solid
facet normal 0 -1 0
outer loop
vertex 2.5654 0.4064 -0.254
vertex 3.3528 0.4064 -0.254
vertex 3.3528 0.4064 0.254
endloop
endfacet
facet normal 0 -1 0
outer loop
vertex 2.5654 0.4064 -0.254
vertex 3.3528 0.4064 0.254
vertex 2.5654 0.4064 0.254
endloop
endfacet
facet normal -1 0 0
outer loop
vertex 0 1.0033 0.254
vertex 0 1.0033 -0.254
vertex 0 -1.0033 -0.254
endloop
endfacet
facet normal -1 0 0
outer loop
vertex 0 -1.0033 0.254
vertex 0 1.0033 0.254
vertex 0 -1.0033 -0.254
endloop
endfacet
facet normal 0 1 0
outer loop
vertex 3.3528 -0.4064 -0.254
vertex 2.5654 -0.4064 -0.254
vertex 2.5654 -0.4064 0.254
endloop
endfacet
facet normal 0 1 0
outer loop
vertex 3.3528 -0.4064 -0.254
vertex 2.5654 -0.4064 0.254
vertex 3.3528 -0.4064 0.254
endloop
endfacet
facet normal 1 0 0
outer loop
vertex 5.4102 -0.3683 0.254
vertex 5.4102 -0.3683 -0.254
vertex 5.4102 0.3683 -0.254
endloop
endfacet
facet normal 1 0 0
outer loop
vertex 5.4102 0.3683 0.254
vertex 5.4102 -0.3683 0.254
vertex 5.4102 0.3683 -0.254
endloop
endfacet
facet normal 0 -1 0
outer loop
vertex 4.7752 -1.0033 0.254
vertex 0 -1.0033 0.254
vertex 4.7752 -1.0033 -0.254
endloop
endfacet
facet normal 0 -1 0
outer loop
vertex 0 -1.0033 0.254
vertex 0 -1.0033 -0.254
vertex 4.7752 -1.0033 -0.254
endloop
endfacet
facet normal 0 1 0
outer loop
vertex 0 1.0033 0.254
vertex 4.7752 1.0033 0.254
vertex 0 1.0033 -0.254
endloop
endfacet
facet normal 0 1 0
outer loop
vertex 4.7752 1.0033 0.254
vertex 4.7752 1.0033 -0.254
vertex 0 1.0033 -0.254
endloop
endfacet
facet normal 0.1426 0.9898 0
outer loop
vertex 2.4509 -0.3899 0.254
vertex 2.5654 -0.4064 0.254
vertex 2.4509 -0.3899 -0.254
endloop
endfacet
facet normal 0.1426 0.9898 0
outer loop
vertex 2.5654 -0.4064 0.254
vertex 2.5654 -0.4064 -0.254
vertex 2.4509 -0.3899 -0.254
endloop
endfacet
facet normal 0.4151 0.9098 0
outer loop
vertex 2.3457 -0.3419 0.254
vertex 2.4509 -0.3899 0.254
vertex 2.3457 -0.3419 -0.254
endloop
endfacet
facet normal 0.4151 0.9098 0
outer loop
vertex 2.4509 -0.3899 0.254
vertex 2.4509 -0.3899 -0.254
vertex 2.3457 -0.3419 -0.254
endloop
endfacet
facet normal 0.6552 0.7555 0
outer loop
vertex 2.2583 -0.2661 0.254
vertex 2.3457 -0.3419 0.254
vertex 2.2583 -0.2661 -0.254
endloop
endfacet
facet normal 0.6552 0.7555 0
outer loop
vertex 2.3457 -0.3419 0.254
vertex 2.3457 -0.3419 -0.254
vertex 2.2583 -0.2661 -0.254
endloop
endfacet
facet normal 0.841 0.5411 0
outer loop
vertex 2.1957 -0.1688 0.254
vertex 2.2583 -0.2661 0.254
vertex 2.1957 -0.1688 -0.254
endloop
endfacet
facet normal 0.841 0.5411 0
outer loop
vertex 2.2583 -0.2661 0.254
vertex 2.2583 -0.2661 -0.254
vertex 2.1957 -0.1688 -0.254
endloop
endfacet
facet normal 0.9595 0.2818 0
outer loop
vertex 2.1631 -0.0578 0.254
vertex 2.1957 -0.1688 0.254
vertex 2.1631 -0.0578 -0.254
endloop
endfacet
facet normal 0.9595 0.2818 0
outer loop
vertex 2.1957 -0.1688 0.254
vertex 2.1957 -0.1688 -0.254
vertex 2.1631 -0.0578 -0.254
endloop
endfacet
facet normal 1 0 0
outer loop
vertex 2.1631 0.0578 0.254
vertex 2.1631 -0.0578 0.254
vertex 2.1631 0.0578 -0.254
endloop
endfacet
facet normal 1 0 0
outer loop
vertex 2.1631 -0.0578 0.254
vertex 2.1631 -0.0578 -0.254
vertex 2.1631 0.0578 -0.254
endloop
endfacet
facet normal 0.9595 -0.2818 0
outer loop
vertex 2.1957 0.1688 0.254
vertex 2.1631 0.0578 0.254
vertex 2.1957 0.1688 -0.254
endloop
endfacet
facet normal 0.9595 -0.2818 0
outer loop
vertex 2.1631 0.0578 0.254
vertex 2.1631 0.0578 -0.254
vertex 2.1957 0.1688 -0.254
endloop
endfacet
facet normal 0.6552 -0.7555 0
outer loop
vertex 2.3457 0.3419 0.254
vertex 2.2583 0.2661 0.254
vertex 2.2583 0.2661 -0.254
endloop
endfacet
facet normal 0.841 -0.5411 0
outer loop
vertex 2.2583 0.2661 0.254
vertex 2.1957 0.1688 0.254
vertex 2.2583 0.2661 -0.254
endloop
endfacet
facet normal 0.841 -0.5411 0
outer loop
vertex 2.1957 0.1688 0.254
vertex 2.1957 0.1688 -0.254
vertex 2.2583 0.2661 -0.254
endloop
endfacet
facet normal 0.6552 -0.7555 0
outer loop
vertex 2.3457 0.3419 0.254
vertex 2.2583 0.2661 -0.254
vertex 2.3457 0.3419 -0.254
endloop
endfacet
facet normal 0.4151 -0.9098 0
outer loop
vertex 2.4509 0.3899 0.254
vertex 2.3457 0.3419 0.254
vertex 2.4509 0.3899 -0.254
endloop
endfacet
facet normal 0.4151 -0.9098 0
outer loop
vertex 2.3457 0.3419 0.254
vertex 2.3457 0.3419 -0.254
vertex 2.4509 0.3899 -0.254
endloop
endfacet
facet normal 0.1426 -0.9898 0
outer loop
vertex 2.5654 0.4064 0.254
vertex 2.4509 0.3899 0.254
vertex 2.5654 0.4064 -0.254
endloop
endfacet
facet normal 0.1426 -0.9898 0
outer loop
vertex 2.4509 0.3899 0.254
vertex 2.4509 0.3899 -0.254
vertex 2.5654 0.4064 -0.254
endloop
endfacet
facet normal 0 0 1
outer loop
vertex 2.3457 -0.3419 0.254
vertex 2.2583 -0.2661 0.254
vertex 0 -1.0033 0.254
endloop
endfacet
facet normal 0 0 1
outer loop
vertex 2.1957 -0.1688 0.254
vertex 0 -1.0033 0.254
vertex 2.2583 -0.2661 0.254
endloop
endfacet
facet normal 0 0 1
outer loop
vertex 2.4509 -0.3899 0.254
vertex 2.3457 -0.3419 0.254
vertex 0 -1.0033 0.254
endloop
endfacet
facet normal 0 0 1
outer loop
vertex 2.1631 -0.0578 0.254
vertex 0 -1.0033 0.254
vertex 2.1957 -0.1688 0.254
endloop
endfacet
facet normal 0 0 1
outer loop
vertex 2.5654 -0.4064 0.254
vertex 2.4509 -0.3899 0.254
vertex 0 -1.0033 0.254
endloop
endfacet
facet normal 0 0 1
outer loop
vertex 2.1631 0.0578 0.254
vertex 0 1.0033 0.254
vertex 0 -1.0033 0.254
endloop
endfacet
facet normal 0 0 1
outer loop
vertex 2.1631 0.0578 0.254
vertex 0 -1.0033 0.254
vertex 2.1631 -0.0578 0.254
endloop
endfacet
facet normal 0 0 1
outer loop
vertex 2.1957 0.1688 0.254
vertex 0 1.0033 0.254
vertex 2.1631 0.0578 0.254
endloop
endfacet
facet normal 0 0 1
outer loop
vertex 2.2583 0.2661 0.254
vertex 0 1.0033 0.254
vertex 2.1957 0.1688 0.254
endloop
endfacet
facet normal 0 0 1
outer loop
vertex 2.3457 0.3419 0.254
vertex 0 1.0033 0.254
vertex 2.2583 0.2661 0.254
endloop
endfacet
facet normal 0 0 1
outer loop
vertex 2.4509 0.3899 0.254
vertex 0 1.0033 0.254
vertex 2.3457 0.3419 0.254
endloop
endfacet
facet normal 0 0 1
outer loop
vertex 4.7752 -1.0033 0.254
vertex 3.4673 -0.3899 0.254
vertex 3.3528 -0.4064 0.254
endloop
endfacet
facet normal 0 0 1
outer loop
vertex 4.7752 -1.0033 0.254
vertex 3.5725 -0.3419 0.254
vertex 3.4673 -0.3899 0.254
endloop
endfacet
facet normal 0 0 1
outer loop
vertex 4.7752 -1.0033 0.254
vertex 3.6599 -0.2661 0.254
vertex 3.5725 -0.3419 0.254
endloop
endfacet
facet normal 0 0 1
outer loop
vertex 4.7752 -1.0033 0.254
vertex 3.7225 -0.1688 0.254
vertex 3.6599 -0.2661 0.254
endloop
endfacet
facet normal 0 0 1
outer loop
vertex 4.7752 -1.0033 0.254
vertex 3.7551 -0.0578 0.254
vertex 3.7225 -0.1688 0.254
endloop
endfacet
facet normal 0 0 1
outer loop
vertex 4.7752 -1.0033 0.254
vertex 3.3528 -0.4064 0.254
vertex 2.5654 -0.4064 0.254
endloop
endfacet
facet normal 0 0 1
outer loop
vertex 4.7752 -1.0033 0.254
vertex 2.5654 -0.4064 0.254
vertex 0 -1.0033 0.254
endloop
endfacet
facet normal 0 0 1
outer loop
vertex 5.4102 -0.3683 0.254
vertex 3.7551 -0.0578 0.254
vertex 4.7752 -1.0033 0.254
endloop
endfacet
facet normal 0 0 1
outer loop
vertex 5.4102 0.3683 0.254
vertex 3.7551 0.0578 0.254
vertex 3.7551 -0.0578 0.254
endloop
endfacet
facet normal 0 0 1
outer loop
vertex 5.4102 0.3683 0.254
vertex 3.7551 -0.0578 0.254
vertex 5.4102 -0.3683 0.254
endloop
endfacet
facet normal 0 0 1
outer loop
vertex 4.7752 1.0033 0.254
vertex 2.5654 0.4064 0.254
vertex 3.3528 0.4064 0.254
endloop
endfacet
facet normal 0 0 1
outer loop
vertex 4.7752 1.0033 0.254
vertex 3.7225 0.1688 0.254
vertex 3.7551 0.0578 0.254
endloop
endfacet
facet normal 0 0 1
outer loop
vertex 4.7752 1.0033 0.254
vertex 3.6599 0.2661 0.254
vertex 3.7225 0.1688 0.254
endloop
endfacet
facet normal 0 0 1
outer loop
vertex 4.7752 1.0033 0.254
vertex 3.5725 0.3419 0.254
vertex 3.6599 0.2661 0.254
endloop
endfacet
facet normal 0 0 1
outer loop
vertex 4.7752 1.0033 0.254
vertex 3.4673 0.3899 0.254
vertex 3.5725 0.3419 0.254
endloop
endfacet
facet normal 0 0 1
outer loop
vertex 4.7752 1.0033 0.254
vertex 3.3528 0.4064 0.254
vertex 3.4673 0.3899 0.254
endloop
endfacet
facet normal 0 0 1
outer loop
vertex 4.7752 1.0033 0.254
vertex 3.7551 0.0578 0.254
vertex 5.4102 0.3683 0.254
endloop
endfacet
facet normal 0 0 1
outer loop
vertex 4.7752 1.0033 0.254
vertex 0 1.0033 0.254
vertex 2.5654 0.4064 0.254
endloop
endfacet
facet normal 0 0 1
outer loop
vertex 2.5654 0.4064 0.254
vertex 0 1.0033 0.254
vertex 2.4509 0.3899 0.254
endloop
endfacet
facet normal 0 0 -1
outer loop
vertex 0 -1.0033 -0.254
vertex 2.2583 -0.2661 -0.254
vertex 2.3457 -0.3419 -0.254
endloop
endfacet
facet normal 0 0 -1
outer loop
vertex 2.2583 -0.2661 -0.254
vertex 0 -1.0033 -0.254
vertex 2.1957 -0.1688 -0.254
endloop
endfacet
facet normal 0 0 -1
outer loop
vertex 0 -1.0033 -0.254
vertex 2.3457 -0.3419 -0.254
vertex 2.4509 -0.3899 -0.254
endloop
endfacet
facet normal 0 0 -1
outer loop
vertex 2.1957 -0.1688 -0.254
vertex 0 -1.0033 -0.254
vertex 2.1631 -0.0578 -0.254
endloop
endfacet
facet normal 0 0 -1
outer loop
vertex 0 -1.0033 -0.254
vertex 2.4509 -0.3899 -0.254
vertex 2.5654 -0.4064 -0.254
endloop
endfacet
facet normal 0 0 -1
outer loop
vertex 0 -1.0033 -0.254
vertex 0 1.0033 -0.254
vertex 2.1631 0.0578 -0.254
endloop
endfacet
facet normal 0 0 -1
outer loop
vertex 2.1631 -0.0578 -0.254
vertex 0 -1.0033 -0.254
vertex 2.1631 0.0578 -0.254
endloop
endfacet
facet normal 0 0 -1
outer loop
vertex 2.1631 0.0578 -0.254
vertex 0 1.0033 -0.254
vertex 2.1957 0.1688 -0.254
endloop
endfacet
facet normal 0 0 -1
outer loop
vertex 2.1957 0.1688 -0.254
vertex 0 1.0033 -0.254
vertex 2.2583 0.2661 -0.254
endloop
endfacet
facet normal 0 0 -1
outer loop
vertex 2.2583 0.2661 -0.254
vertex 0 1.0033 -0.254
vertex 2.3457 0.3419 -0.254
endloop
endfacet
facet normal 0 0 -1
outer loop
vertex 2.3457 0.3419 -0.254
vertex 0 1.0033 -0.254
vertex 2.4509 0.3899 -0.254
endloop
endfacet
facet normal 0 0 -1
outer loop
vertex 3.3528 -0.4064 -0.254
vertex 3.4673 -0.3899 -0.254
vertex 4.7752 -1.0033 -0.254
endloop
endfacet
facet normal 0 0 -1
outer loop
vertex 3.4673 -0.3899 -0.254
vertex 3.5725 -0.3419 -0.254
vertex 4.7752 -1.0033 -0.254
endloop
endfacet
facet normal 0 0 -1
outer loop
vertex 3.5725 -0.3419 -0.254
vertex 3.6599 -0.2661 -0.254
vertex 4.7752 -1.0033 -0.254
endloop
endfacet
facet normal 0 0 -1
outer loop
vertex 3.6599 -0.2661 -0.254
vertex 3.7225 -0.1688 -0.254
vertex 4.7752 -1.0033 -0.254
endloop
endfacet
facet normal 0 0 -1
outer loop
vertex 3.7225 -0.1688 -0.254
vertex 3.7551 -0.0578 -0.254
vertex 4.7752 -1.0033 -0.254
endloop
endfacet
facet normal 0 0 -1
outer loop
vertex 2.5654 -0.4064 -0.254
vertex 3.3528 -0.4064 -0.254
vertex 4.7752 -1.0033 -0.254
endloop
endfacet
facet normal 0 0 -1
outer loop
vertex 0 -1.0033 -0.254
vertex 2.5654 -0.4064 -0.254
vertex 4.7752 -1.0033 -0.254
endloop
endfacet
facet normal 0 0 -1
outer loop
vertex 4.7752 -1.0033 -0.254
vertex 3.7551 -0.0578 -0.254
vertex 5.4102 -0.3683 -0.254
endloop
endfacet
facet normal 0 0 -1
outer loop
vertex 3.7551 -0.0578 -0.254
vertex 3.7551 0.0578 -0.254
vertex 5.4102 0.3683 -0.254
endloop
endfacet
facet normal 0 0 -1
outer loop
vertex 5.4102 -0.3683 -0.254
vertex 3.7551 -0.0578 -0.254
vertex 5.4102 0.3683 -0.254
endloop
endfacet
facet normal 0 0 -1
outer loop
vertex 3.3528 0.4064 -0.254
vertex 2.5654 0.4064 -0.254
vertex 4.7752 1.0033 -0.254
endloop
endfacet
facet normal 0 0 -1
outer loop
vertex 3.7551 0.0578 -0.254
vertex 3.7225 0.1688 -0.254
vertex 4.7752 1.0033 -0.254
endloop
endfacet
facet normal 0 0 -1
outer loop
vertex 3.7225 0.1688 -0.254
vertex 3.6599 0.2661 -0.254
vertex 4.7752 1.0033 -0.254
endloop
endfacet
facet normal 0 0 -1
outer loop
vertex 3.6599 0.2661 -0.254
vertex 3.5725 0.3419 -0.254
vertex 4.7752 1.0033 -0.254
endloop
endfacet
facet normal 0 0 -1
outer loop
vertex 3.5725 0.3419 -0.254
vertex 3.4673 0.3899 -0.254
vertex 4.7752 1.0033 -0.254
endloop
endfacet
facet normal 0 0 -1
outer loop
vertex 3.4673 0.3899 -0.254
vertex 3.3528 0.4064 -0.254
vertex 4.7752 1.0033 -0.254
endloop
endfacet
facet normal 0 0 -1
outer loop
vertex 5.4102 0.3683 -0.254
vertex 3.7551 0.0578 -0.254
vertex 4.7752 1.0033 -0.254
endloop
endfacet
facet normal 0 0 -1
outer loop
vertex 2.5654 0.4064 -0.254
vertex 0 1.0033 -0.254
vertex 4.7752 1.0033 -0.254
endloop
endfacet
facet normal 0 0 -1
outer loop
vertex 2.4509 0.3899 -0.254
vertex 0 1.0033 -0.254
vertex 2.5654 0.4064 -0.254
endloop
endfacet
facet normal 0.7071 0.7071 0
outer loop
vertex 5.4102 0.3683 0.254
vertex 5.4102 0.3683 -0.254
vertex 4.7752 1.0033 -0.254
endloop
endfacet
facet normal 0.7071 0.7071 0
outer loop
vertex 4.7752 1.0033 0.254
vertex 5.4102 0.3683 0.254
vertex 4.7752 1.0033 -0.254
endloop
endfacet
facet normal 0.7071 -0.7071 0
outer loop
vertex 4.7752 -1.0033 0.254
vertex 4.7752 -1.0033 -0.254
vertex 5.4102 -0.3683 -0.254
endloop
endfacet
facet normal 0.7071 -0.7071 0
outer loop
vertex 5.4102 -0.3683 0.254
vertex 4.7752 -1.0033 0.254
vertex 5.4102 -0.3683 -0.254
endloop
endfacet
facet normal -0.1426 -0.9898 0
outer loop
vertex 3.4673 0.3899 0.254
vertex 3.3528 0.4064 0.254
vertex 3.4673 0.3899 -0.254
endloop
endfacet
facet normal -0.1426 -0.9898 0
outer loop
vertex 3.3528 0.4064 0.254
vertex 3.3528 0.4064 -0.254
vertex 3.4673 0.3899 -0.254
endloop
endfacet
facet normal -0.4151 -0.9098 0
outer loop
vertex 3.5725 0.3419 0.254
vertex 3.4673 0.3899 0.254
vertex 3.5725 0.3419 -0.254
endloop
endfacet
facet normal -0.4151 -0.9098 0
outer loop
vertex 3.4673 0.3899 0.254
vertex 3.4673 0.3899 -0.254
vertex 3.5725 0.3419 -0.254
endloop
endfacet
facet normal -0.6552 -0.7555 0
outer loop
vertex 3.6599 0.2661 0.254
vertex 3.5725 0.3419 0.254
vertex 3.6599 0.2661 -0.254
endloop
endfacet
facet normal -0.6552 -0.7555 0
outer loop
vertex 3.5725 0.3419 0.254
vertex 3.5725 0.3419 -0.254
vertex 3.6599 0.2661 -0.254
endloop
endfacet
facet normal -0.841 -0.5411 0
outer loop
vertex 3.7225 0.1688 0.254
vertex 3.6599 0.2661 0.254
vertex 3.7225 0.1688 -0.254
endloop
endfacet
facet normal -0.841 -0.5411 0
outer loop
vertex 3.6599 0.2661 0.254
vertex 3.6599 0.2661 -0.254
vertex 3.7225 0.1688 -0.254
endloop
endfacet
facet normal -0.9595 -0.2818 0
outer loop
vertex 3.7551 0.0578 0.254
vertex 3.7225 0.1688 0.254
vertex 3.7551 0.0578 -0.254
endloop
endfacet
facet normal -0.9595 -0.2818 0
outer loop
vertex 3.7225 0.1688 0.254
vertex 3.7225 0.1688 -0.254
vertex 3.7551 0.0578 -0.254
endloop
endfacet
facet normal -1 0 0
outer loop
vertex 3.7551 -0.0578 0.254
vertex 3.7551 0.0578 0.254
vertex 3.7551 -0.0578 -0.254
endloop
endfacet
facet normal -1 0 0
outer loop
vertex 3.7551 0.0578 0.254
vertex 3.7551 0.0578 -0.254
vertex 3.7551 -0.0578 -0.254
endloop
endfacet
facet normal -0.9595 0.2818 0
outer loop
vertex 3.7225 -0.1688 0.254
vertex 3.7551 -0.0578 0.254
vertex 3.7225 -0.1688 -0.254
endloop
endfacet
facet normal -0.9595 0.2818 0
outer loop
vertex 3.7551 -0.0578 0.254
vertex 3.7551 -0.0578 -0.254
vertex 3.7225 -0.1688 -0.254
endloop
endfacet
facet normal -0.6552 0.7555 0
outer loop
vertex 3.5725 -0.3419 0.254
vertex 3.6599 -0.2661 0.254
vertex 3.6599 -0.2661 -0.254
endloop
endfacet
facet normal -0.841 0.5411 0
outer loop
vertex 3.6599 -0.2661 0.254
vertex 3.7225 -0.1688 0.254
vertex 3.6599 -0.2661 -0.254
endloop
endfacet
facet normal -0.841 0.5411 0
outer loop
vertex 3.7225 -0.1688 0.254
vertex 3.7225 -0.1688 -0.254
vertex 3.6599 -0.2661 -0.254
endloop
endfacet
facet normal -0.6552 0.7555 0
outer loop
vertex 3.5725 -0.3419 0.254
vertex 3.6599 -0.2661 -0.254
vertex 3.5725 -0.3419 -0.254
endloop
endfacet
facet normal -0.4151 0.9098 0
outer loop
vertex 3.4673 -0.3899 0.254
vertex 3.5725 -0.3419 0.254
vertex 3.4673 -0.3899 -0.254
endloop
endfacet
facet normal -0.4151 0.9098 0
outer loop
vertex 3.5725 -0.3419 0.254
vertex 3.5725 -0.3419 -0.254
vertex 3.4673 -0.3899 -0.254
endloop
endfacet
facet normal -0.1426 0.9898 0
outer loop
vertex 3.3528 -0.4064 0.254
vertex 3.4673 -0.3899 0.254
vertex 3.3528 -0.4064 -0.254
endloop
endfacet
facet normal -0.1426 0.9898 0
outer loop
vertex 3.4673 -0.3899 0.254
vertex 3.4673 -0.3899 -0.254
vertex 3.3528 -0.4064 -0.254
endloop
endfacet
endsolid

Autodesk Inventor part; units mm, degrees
sketch "Sketch_1" plane through (0, 0, 0) normal (0, 0, 1) x (1, 0, 0)
  line L0 (0, 1.0033) -> (0, -1.0033)
  line L1 (0, -1.0033) -> (4.7752, -1.0033)
  line L2 (4.7752, -1.0033) -> (5.4102, -0.3683)
  line L3 (5.4102, -0.3683) -> (5.4102, 0.3683)
  line L4 (5.4102, 0.3683) -> (4.7752, 1.0033)
  line L5 (4.7752, 1.0033) -> (0, 1.0033)
  arc A0 (2.5654, 0.4064) -> (2.5654, -0.4064) centre (2.5654, 0) ccw
  line L6 (2.5654, -0.4064) -> (3.3528, -0.4064)
  arc A1 (3.3528, -0.4064) -> (3.3528, 0.4064) centre (3.3528, 0) ccw
  line L7 (3.3528, 0.4064) -> (2.5654, 0.4064)
extrude "Extrusion1" add sketch "Sketch_1" along normal mid plane 0.508
ref_plane "P_XY" through (0, 0, 0) normal (1, 0, 0) x (0, 0, -1)
ref_plane "P_YZ" through (0, 0, 0) normal (0, 0, -1) x (0, 1, 0)
ref_plane "P_ZX" through (0, 0, 0) normal (0, 1, 0) x (1, 0, 0)
properties part number "UB16NKG015F-NR"
